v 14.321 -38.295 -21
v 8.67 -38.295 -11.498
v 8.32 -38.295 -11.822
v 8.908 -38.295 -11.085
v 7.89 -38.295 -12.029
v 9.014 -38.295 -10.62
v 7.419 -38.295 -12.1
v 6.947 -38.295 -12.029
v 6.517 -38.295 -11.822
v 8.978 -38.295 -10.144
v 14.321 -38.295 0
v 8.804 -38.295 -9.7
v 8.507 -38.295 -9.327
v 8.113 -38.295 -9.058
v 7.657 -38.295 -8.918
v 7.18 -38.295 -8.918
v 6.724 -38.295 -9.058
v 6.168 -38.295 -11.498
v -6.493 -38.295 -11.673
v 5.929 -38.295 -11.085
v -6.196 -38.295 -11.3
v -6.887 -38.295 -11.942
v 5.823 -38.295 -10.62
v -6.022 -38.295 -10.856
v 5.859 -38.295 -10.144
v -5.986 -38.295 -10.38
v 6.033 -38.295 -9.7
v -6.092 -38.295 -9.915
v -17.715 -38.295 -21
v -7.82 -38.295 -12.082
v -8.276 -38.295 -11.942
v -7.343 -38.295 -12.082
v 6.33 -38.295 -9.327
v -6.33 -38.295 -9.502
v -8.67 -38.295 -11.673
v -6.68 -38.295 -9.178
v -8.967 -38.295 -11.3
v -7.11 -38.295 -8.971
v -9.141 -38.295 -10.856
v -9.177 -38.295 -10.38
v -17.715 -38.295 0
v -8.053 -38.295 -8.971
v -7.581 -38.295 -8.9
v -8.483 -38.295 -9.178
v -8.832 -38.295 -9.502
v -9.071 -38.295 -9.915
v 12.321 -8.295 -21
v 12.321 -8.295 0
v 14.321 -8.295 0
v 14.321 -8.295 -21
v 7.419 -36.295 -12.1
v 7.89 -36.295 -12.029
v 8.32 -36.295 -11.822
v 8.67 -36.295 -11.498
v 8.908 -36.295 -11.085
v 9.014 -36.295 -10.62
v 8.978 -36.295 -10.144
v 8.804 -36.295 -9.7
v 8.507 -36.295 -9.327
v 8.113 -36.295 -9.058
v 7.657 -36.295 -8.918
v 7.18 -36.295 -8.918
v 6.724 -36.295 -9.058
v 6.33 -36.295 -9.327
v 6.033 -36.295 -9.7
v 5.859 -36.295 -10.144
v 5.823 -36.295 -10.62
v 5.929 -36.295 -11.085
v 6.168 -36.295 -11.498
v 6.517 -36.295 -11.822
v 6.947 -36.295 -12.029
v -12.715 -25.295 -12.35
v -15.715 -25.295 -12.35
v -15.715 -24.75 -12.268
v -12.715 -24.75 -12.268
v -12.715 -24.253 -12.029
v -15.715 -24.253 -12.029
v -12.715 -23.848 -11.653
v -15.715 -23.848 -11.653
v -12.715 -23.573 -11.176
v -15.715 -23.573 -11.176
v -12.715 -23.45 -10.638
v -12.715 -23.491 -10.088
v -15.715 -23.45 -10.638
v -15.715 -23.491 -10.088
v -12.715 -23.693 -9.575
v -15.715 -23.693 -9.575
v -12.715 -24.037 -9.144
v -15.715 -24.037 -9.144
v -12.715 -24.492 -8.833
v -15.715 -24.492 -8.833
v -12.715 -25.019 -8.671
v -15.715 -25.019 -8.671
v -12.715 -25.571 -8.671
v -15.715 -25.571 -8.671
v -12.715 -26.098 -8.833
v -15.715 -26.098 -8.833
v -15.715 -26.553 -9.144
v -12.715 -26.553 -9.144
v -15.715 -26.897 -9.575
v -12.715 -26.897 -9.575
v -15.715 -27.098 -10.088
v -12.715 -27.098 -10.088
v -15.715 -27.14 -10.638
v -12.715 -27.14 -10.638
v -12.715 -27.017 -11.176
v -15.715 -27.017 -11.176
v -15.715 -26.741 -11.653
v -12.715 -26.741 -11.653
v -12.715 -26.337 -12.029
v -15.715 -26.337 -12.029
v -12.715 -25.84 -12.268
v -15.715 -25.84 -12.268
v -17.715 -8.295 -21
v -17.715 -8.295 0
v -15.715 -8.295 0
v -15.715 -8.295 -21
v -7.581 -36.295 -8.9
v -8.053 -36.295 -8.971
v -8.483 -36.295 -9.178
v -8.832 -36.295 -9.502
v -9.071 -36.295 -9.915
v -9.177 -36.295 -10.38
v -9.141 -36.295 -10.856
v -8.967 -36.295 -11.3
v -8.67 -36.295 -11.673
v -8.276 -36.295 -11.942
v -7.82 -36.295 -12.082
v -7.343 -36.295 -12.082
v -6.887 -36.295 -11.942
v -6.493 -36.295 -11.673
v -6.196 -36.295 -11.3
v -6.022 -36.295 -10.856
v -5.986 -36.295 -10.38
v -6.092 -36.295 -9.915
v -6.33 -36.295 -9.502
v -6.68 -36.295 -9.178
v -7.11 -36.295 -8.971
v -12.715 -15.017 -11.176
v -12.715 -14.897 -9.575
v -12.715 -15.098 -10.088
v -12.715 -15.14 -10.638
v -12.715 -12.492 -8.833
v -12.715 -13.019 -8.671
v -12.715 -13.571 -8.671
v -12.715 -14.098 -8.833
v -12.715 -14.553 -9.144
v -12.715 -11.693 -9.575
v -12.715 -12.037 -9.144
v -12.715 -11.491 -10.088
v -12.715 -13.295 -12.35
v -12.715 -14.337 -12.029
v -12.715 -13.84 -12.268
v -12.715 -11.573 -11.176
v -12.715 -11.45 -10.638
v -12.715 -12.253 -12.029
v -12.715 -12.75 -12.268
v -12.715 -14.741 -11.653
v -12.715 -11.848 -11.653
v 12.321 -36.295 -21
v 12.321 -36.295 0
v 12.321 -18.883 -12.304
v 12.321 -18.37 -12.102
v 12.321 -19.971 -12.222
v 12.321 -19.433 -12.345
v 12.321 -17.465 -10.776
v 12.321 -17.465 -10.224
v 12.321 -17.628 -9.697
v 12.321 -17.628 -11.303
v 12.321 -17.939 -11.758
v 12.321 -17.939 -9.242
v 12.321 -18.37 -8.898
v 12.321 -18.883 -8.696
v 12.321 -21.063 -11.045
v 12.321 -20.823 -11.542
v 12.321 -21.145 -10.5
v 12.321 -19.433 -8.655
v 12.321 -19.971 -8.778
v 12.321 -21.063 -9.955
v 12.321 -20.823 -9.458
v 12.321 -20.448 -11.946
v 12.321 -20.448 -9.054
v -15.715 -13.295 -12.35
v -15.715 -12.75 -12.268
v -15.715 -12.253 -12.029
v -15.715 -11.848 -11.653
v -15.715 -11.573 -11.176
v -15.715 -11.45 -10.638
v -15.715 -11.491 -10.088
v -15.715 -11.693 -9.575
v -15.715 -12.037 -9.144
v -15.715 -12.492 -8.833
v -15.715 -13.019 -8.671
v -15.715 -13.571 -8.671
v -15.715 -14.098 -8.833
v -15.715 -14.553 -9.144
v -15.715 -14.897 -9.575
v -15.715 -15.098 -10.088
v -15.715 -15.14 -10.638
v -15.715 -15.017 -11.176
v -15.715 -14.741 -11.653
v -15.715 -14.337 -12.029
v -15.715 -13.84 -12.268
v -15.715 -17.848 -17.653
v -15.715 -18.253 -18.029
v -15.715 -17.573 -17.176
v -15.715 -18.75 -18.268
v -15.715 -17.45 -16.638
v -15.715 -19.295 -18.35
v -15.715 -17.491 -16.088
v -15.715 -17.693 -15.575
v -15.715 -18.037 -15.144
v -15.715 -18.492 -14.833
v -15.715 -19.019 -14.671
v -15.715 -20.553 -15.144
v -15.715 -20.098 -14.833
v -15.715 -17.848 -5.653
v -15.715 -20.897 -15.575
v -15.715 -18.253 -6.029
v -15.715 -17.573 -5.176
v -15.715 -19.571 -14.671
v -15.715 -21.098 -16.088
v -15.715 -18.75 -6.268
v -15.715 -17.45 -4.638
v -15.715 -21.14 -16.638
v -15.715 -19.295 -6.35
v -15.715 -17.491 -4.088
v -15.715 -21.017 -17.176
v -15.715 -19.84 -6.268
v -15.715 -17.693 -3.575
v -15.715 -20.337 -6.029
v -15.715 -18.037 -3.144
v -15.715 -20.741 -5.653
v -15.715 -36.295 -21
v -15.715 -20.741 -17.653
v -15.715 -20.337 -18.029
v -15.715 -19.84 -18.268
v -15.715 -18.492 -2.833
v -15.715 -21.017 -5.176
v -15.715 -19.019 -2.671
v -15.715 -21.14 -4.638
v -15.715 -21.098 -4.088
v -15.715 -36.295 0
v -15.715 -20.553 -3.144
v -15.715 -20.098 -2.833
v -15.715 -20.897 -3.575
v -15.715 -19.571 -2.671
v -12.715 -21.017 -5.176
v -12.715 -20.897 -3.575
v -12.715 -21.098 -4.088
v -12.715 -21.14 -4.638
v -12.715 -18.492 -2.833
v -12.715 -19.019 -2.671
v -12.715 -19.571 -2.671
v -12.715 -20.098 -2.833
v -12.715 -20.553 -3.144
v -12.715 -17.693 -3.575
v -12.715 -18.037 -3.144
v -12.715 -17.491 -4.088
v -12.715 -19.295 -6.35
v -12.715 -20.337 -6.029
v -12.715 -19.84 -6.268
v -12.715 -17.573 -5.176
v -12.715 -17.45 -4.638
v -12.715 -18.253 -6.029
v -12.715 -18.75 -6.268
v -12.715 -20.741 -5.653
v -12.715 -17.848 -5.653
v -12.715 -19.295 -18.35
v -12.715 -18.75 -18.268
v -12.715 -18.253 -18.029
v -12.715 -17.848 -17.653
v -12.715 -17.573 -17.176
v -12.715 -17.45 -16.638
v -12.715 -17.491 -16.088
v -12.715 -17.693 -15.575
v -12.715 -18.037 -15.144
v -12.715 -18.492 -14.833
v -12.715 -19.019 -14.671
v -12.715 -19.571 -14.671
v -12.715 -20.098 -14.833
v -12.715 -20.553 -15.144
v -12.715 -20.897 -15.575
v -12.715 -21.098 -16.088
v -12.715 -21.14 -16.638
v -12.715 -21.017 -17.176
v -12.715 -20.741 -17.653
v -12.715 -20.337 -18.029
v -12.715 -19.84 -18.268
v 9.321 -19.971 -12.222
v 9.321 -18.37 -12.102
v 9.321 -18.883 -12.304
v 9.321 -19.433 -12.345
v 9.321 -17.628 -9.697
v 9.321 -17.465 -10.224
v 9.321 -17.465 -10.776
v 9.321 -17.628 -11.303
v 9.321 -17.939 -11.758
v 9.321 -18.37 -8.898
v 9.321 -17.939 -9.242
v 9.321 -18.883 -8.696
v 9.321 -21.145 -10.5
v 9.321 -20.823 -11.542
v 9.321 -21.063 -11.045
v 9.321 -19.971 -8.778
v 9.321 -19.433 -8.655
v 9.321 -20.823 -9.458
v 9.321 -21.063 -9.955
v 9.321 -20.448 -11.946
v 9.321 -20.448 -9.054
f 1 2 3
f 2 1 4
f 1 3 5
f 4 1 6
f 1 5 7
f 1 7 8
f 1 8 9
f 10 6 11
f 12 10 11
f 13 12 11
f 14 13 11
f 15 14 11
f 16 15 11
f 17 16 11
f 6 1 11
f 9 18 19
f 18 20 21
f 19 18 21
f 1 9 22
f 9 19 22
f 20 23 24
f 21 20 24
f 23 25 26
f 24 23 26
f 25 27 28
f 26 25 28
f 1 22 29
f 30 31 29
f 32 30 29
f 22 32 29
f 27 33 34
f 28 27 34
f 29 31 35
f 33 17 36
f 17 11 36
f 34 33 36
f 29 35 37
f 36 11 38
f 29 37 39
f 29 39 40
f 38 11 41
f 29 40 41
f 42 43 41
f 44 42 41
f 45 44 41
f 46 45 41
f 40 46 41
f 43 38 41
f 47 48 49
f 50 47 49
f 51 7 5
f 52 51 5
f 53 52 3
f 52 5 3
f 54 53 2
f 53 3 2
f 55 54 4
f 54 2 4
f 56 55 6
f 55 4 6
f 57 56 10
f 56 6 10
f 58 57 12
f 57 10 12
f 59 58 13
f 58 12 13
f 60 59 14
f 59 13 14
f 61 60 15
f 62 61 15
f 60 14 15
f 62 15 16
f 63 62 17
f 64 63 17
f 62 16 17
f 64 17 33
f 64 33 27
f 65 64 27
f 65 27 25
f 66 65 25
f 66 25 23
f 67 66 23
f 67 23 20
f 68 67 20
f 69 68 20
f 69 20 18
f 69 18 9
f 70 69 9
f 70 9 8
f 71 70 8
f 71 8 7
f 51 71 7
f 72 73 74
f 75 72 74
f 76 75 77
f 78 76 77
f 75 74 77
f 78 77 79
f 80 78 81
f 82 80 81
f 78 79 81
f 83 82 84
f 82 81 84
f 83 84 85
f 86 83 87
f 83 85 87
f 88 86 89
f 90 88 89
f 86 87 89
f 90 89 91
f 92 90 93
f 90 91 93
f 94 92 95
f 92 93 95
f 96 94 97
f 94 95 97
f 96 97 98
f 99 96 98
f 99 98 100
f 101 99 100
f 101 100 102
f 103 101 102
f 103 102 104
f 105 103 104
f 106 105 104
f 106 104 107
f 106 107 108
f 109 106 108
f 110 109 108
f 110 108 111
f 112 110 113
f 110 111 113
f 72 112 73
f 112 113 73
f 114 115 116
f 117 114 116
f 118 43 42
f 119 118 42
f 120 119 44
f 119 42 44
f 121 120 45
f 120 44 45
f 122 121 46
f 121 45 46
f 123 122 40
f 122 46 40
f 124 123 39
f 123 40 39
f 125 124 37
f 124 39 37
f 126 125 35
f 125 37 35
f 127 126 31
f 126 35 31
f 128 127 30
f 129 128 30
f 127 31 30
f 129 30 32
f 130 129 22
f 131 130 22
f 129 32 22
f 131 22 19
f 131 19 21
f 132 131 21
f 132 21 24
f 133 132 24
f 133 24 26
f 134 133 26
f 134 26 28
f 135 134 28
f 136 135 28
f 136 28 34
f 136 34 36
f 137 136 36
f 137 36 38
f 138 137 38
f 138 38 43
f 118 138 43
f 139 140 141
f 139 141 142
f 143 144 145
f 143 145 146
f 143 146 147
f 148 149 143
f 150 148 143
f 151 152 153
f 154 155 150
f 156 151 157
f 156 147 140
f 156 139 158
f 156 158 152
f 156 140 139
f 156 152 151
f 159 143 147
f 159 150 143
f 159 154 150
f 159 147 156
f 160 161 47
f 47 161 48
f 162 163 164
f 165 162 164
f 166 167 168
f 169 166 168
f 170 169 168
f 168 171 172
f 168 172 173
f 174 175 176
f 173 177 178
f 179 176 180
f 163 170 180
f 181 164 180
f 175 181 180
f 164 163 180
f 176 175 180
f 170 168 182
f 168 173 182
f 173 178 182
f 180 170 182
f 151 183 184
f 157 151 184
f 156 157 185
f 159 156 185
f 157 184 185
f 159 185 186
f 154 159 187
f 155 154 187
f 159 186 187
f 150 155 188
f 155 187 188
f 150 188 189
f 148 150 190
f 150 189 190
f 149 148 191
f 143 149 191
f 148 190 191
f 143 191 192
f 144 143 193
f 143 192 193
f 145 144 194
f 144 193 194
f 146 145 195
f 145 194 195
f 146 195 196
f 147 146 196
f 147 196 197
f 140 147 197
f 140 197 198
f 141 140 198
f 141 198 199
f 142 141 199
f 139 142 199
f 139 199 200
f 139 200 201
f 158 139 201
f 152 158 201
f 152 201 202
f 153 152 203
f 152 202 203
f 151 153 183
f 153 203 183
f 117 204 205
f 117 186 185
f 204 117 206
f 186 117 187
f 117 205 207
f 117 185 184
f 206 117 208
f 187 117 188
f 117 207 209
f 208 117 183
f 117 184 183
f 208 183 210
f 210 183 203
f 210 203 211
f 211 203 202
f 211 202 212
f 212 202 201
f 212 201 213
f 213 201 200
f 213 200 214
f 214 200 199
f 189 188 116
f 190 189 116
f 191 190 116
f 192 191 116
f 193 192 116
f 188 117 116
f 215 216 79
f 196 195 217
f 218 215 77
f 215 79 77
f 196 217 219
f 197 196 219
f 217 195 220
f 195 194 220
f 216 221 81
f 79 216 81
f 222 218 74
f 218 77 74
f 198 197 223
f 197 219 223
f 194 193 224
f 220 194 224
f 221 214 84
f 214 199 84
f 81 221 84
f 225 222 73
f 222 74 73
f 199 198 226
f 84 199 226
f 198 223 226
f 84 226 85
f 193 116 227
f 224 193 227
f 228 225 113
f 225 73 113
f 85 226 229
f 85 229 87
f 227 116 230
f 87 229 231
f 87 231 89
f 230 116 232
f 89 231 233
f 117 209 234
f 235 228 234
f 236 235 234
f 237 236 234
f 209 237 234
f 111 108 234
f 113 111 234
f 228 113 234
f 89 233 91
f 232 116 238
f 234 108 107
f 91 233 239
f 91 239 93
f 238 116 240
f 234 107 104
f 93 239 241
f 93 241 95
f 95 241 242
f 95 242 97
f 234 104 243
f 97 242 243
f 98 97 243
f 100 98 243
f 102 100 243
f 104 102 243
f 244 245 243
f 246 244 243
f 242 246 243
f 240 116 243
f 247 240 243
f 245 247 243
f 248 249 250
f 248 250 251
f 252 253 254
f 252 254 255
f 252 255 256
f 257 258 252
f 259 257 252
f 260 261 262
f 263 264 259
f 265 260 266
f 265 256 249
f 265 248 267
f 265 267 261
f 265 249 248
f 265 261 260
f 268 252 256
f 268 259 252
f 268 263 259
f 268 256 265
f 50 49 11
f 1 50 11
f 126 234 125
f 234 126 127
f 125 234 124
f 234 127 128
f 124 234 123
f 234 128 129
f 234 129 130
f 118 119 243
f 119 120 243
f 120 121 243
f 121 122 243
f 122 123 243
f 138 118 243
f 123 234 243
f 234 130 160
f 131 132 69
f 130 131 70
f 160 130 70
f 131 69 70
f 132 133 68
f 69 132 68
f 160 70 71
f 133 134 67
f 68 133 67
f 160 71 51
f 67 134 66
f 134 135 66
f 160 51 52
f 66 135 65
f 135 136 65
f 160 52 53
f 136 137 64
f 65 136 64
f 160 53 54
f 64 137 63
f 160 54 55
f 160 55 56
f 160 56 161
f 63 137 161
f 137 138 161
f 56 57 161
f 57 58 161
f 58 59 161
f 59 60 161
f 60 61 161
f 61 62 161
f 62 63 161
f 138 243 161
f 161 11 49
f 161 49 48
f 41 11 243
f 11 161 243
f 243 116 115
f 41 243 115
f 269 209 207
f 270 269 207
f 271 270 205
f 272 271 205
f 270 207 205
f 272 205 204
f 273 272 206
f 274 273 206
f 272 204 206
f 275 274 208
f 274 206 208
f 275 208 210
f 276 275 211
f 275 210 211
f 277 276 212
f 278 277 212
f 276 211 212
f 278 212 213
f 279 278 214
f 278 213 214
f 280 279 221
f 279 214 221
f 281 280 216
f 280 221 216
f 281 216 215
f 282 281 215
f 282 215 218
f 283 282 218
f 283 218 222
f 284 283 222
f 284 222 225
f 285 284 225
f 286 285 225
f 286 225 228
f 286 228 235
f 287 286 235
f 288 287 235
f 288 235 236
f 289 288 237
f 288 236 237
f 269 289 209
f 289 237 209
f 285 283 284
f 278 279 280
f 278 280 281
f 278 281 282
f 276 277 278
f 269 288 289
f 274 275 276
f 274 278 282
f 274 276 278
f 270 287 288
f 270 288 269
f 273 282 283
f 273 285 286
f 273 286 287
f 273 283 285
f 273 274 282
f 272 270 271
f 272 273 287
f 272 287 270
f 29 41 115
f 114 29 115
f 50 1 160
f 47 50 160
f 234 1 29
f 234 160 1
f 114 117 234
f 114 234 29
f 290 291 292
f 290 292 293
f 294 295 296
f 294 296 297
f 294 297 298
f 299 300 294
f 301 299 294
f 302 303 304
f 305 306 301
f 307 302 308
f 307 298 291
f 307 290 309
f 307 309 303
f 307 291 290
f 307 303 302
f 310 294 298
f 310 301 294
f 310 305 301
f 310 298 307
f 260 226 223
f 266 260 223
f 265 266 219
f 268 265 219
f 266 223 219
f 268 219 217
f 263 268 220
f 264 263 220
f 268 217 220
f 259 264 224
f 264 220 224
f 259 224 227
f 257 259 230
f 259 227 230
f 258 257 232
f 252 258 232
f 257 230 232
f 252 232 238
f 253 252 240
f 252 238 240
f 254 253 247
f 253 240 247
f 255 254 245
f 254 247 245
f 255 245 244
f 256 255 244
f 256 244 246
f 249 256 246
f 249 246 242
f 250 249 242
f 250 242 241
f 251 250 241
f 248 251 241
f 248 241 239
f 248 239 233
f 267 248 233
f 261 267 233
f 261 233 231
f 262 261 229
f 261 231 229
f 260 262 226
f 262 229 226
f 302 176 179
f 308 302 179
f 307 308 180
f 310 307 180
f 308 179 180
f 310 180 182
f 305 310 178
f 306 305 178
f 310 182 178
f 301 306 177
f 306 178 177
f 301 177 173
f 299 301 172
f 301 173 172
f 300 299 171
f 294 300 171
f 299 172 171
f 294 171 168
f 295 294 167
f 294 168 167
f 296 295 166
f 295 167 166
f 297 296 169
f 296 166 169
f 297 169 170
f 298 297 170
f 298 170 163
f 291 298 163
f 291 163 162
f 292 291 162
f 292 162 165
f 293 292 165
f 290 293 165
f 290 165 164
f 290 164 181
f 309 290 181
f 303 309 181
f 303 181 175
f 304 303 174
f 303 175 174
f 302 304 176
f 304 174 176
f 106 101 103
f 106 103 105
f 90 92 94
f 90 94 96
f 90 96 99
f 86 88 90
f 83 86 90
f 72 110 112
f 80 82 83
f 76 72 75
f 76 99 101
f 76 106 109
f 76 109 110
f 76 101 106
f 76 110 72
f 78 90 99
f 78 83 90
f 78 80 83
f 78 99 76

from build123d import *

# Parameters (mm, degrees)
BOSS_EXTRUDE4_DEPTH = 21
SKETCH2_R           = 1.85
BOSS_EXTRUDE5_DEPTH = 3
SKETCH3_R           = 1.85
BOSS_EXTRUDE6_DEPTH = 3
SKETCH6_R           = 1.6
CUT_EXTRUDE1_DEPTH  = 3


with BuildPart() as part:
    # Sketch1 → Boss-Extrude4 (new body)
    with BuildSketch(Plane.XY):
        Polygon((12.320696932, -8.294821565), (14.320696932, -8.294821565), (14.320696932, -38.294821565), (-17.714685402, -38.294821565), (-17.714685402, -8.294821565), (-15.714685402, -8.294821565), (-15.714685402, -36.294821565), (12.320696932, -36.294821565), align=None)
    extrude(amount=-BOSS_EXTRUDE4_DEPTH)

    # Sketch2 → Boss-Extrude5 (add)
    with BuildSketch(Plane(origin=(-15.714685402, 0, 0), x_dir=(0, 0, -1), z_dir=(1, 0, 0))):
        with Locations((10.5, -25.294821565)):
            Circle(SKETCH2_R)
        with Locations((16.5, -19.294821565)):
            Circle(SKETCH2_R)
        with Locations((4.5, -19.294821565)):
            Circle(SKETCH2_R)
        with Locations((10.5, -13.294821565)):
            Circle(SKETCH2_R)
    extrude(amount=BOSS_EXTRUDE5_DEPTH)

    # Sketch6 → Cut-Extrude1 (cut)
    with BuildSketch(Plane.XZ.offset(38.294821565)):
        with Locations(Location((7.418581263, -10.5, 0), (0, 0, 270))):
            Circle(SKETCH6_R)
        with Locations(Location((-7.581418737, -10.5, 0), (0, 0, 90))):
            Circle(SKETCH6_R)
    extrude(amount=-CUT_EXTRUDE1_DEPTH, mode=Mode.SUBTRACT)


with BuildPart() as body_2:
    # Sketch3 → Boss-Extrude6 (new body)
    with BuildSketch(Plane.ZY.offset(-12.320696932)):
        with Locations(Location((-10.5, -19.294821565, 0), (0, 0, 270))):
            Circle(SKETCH3_R)
    extrude(amount=BOSS_EXTRUDE6_DEPTH)


solid = Compound([part.part, body_2.part])
